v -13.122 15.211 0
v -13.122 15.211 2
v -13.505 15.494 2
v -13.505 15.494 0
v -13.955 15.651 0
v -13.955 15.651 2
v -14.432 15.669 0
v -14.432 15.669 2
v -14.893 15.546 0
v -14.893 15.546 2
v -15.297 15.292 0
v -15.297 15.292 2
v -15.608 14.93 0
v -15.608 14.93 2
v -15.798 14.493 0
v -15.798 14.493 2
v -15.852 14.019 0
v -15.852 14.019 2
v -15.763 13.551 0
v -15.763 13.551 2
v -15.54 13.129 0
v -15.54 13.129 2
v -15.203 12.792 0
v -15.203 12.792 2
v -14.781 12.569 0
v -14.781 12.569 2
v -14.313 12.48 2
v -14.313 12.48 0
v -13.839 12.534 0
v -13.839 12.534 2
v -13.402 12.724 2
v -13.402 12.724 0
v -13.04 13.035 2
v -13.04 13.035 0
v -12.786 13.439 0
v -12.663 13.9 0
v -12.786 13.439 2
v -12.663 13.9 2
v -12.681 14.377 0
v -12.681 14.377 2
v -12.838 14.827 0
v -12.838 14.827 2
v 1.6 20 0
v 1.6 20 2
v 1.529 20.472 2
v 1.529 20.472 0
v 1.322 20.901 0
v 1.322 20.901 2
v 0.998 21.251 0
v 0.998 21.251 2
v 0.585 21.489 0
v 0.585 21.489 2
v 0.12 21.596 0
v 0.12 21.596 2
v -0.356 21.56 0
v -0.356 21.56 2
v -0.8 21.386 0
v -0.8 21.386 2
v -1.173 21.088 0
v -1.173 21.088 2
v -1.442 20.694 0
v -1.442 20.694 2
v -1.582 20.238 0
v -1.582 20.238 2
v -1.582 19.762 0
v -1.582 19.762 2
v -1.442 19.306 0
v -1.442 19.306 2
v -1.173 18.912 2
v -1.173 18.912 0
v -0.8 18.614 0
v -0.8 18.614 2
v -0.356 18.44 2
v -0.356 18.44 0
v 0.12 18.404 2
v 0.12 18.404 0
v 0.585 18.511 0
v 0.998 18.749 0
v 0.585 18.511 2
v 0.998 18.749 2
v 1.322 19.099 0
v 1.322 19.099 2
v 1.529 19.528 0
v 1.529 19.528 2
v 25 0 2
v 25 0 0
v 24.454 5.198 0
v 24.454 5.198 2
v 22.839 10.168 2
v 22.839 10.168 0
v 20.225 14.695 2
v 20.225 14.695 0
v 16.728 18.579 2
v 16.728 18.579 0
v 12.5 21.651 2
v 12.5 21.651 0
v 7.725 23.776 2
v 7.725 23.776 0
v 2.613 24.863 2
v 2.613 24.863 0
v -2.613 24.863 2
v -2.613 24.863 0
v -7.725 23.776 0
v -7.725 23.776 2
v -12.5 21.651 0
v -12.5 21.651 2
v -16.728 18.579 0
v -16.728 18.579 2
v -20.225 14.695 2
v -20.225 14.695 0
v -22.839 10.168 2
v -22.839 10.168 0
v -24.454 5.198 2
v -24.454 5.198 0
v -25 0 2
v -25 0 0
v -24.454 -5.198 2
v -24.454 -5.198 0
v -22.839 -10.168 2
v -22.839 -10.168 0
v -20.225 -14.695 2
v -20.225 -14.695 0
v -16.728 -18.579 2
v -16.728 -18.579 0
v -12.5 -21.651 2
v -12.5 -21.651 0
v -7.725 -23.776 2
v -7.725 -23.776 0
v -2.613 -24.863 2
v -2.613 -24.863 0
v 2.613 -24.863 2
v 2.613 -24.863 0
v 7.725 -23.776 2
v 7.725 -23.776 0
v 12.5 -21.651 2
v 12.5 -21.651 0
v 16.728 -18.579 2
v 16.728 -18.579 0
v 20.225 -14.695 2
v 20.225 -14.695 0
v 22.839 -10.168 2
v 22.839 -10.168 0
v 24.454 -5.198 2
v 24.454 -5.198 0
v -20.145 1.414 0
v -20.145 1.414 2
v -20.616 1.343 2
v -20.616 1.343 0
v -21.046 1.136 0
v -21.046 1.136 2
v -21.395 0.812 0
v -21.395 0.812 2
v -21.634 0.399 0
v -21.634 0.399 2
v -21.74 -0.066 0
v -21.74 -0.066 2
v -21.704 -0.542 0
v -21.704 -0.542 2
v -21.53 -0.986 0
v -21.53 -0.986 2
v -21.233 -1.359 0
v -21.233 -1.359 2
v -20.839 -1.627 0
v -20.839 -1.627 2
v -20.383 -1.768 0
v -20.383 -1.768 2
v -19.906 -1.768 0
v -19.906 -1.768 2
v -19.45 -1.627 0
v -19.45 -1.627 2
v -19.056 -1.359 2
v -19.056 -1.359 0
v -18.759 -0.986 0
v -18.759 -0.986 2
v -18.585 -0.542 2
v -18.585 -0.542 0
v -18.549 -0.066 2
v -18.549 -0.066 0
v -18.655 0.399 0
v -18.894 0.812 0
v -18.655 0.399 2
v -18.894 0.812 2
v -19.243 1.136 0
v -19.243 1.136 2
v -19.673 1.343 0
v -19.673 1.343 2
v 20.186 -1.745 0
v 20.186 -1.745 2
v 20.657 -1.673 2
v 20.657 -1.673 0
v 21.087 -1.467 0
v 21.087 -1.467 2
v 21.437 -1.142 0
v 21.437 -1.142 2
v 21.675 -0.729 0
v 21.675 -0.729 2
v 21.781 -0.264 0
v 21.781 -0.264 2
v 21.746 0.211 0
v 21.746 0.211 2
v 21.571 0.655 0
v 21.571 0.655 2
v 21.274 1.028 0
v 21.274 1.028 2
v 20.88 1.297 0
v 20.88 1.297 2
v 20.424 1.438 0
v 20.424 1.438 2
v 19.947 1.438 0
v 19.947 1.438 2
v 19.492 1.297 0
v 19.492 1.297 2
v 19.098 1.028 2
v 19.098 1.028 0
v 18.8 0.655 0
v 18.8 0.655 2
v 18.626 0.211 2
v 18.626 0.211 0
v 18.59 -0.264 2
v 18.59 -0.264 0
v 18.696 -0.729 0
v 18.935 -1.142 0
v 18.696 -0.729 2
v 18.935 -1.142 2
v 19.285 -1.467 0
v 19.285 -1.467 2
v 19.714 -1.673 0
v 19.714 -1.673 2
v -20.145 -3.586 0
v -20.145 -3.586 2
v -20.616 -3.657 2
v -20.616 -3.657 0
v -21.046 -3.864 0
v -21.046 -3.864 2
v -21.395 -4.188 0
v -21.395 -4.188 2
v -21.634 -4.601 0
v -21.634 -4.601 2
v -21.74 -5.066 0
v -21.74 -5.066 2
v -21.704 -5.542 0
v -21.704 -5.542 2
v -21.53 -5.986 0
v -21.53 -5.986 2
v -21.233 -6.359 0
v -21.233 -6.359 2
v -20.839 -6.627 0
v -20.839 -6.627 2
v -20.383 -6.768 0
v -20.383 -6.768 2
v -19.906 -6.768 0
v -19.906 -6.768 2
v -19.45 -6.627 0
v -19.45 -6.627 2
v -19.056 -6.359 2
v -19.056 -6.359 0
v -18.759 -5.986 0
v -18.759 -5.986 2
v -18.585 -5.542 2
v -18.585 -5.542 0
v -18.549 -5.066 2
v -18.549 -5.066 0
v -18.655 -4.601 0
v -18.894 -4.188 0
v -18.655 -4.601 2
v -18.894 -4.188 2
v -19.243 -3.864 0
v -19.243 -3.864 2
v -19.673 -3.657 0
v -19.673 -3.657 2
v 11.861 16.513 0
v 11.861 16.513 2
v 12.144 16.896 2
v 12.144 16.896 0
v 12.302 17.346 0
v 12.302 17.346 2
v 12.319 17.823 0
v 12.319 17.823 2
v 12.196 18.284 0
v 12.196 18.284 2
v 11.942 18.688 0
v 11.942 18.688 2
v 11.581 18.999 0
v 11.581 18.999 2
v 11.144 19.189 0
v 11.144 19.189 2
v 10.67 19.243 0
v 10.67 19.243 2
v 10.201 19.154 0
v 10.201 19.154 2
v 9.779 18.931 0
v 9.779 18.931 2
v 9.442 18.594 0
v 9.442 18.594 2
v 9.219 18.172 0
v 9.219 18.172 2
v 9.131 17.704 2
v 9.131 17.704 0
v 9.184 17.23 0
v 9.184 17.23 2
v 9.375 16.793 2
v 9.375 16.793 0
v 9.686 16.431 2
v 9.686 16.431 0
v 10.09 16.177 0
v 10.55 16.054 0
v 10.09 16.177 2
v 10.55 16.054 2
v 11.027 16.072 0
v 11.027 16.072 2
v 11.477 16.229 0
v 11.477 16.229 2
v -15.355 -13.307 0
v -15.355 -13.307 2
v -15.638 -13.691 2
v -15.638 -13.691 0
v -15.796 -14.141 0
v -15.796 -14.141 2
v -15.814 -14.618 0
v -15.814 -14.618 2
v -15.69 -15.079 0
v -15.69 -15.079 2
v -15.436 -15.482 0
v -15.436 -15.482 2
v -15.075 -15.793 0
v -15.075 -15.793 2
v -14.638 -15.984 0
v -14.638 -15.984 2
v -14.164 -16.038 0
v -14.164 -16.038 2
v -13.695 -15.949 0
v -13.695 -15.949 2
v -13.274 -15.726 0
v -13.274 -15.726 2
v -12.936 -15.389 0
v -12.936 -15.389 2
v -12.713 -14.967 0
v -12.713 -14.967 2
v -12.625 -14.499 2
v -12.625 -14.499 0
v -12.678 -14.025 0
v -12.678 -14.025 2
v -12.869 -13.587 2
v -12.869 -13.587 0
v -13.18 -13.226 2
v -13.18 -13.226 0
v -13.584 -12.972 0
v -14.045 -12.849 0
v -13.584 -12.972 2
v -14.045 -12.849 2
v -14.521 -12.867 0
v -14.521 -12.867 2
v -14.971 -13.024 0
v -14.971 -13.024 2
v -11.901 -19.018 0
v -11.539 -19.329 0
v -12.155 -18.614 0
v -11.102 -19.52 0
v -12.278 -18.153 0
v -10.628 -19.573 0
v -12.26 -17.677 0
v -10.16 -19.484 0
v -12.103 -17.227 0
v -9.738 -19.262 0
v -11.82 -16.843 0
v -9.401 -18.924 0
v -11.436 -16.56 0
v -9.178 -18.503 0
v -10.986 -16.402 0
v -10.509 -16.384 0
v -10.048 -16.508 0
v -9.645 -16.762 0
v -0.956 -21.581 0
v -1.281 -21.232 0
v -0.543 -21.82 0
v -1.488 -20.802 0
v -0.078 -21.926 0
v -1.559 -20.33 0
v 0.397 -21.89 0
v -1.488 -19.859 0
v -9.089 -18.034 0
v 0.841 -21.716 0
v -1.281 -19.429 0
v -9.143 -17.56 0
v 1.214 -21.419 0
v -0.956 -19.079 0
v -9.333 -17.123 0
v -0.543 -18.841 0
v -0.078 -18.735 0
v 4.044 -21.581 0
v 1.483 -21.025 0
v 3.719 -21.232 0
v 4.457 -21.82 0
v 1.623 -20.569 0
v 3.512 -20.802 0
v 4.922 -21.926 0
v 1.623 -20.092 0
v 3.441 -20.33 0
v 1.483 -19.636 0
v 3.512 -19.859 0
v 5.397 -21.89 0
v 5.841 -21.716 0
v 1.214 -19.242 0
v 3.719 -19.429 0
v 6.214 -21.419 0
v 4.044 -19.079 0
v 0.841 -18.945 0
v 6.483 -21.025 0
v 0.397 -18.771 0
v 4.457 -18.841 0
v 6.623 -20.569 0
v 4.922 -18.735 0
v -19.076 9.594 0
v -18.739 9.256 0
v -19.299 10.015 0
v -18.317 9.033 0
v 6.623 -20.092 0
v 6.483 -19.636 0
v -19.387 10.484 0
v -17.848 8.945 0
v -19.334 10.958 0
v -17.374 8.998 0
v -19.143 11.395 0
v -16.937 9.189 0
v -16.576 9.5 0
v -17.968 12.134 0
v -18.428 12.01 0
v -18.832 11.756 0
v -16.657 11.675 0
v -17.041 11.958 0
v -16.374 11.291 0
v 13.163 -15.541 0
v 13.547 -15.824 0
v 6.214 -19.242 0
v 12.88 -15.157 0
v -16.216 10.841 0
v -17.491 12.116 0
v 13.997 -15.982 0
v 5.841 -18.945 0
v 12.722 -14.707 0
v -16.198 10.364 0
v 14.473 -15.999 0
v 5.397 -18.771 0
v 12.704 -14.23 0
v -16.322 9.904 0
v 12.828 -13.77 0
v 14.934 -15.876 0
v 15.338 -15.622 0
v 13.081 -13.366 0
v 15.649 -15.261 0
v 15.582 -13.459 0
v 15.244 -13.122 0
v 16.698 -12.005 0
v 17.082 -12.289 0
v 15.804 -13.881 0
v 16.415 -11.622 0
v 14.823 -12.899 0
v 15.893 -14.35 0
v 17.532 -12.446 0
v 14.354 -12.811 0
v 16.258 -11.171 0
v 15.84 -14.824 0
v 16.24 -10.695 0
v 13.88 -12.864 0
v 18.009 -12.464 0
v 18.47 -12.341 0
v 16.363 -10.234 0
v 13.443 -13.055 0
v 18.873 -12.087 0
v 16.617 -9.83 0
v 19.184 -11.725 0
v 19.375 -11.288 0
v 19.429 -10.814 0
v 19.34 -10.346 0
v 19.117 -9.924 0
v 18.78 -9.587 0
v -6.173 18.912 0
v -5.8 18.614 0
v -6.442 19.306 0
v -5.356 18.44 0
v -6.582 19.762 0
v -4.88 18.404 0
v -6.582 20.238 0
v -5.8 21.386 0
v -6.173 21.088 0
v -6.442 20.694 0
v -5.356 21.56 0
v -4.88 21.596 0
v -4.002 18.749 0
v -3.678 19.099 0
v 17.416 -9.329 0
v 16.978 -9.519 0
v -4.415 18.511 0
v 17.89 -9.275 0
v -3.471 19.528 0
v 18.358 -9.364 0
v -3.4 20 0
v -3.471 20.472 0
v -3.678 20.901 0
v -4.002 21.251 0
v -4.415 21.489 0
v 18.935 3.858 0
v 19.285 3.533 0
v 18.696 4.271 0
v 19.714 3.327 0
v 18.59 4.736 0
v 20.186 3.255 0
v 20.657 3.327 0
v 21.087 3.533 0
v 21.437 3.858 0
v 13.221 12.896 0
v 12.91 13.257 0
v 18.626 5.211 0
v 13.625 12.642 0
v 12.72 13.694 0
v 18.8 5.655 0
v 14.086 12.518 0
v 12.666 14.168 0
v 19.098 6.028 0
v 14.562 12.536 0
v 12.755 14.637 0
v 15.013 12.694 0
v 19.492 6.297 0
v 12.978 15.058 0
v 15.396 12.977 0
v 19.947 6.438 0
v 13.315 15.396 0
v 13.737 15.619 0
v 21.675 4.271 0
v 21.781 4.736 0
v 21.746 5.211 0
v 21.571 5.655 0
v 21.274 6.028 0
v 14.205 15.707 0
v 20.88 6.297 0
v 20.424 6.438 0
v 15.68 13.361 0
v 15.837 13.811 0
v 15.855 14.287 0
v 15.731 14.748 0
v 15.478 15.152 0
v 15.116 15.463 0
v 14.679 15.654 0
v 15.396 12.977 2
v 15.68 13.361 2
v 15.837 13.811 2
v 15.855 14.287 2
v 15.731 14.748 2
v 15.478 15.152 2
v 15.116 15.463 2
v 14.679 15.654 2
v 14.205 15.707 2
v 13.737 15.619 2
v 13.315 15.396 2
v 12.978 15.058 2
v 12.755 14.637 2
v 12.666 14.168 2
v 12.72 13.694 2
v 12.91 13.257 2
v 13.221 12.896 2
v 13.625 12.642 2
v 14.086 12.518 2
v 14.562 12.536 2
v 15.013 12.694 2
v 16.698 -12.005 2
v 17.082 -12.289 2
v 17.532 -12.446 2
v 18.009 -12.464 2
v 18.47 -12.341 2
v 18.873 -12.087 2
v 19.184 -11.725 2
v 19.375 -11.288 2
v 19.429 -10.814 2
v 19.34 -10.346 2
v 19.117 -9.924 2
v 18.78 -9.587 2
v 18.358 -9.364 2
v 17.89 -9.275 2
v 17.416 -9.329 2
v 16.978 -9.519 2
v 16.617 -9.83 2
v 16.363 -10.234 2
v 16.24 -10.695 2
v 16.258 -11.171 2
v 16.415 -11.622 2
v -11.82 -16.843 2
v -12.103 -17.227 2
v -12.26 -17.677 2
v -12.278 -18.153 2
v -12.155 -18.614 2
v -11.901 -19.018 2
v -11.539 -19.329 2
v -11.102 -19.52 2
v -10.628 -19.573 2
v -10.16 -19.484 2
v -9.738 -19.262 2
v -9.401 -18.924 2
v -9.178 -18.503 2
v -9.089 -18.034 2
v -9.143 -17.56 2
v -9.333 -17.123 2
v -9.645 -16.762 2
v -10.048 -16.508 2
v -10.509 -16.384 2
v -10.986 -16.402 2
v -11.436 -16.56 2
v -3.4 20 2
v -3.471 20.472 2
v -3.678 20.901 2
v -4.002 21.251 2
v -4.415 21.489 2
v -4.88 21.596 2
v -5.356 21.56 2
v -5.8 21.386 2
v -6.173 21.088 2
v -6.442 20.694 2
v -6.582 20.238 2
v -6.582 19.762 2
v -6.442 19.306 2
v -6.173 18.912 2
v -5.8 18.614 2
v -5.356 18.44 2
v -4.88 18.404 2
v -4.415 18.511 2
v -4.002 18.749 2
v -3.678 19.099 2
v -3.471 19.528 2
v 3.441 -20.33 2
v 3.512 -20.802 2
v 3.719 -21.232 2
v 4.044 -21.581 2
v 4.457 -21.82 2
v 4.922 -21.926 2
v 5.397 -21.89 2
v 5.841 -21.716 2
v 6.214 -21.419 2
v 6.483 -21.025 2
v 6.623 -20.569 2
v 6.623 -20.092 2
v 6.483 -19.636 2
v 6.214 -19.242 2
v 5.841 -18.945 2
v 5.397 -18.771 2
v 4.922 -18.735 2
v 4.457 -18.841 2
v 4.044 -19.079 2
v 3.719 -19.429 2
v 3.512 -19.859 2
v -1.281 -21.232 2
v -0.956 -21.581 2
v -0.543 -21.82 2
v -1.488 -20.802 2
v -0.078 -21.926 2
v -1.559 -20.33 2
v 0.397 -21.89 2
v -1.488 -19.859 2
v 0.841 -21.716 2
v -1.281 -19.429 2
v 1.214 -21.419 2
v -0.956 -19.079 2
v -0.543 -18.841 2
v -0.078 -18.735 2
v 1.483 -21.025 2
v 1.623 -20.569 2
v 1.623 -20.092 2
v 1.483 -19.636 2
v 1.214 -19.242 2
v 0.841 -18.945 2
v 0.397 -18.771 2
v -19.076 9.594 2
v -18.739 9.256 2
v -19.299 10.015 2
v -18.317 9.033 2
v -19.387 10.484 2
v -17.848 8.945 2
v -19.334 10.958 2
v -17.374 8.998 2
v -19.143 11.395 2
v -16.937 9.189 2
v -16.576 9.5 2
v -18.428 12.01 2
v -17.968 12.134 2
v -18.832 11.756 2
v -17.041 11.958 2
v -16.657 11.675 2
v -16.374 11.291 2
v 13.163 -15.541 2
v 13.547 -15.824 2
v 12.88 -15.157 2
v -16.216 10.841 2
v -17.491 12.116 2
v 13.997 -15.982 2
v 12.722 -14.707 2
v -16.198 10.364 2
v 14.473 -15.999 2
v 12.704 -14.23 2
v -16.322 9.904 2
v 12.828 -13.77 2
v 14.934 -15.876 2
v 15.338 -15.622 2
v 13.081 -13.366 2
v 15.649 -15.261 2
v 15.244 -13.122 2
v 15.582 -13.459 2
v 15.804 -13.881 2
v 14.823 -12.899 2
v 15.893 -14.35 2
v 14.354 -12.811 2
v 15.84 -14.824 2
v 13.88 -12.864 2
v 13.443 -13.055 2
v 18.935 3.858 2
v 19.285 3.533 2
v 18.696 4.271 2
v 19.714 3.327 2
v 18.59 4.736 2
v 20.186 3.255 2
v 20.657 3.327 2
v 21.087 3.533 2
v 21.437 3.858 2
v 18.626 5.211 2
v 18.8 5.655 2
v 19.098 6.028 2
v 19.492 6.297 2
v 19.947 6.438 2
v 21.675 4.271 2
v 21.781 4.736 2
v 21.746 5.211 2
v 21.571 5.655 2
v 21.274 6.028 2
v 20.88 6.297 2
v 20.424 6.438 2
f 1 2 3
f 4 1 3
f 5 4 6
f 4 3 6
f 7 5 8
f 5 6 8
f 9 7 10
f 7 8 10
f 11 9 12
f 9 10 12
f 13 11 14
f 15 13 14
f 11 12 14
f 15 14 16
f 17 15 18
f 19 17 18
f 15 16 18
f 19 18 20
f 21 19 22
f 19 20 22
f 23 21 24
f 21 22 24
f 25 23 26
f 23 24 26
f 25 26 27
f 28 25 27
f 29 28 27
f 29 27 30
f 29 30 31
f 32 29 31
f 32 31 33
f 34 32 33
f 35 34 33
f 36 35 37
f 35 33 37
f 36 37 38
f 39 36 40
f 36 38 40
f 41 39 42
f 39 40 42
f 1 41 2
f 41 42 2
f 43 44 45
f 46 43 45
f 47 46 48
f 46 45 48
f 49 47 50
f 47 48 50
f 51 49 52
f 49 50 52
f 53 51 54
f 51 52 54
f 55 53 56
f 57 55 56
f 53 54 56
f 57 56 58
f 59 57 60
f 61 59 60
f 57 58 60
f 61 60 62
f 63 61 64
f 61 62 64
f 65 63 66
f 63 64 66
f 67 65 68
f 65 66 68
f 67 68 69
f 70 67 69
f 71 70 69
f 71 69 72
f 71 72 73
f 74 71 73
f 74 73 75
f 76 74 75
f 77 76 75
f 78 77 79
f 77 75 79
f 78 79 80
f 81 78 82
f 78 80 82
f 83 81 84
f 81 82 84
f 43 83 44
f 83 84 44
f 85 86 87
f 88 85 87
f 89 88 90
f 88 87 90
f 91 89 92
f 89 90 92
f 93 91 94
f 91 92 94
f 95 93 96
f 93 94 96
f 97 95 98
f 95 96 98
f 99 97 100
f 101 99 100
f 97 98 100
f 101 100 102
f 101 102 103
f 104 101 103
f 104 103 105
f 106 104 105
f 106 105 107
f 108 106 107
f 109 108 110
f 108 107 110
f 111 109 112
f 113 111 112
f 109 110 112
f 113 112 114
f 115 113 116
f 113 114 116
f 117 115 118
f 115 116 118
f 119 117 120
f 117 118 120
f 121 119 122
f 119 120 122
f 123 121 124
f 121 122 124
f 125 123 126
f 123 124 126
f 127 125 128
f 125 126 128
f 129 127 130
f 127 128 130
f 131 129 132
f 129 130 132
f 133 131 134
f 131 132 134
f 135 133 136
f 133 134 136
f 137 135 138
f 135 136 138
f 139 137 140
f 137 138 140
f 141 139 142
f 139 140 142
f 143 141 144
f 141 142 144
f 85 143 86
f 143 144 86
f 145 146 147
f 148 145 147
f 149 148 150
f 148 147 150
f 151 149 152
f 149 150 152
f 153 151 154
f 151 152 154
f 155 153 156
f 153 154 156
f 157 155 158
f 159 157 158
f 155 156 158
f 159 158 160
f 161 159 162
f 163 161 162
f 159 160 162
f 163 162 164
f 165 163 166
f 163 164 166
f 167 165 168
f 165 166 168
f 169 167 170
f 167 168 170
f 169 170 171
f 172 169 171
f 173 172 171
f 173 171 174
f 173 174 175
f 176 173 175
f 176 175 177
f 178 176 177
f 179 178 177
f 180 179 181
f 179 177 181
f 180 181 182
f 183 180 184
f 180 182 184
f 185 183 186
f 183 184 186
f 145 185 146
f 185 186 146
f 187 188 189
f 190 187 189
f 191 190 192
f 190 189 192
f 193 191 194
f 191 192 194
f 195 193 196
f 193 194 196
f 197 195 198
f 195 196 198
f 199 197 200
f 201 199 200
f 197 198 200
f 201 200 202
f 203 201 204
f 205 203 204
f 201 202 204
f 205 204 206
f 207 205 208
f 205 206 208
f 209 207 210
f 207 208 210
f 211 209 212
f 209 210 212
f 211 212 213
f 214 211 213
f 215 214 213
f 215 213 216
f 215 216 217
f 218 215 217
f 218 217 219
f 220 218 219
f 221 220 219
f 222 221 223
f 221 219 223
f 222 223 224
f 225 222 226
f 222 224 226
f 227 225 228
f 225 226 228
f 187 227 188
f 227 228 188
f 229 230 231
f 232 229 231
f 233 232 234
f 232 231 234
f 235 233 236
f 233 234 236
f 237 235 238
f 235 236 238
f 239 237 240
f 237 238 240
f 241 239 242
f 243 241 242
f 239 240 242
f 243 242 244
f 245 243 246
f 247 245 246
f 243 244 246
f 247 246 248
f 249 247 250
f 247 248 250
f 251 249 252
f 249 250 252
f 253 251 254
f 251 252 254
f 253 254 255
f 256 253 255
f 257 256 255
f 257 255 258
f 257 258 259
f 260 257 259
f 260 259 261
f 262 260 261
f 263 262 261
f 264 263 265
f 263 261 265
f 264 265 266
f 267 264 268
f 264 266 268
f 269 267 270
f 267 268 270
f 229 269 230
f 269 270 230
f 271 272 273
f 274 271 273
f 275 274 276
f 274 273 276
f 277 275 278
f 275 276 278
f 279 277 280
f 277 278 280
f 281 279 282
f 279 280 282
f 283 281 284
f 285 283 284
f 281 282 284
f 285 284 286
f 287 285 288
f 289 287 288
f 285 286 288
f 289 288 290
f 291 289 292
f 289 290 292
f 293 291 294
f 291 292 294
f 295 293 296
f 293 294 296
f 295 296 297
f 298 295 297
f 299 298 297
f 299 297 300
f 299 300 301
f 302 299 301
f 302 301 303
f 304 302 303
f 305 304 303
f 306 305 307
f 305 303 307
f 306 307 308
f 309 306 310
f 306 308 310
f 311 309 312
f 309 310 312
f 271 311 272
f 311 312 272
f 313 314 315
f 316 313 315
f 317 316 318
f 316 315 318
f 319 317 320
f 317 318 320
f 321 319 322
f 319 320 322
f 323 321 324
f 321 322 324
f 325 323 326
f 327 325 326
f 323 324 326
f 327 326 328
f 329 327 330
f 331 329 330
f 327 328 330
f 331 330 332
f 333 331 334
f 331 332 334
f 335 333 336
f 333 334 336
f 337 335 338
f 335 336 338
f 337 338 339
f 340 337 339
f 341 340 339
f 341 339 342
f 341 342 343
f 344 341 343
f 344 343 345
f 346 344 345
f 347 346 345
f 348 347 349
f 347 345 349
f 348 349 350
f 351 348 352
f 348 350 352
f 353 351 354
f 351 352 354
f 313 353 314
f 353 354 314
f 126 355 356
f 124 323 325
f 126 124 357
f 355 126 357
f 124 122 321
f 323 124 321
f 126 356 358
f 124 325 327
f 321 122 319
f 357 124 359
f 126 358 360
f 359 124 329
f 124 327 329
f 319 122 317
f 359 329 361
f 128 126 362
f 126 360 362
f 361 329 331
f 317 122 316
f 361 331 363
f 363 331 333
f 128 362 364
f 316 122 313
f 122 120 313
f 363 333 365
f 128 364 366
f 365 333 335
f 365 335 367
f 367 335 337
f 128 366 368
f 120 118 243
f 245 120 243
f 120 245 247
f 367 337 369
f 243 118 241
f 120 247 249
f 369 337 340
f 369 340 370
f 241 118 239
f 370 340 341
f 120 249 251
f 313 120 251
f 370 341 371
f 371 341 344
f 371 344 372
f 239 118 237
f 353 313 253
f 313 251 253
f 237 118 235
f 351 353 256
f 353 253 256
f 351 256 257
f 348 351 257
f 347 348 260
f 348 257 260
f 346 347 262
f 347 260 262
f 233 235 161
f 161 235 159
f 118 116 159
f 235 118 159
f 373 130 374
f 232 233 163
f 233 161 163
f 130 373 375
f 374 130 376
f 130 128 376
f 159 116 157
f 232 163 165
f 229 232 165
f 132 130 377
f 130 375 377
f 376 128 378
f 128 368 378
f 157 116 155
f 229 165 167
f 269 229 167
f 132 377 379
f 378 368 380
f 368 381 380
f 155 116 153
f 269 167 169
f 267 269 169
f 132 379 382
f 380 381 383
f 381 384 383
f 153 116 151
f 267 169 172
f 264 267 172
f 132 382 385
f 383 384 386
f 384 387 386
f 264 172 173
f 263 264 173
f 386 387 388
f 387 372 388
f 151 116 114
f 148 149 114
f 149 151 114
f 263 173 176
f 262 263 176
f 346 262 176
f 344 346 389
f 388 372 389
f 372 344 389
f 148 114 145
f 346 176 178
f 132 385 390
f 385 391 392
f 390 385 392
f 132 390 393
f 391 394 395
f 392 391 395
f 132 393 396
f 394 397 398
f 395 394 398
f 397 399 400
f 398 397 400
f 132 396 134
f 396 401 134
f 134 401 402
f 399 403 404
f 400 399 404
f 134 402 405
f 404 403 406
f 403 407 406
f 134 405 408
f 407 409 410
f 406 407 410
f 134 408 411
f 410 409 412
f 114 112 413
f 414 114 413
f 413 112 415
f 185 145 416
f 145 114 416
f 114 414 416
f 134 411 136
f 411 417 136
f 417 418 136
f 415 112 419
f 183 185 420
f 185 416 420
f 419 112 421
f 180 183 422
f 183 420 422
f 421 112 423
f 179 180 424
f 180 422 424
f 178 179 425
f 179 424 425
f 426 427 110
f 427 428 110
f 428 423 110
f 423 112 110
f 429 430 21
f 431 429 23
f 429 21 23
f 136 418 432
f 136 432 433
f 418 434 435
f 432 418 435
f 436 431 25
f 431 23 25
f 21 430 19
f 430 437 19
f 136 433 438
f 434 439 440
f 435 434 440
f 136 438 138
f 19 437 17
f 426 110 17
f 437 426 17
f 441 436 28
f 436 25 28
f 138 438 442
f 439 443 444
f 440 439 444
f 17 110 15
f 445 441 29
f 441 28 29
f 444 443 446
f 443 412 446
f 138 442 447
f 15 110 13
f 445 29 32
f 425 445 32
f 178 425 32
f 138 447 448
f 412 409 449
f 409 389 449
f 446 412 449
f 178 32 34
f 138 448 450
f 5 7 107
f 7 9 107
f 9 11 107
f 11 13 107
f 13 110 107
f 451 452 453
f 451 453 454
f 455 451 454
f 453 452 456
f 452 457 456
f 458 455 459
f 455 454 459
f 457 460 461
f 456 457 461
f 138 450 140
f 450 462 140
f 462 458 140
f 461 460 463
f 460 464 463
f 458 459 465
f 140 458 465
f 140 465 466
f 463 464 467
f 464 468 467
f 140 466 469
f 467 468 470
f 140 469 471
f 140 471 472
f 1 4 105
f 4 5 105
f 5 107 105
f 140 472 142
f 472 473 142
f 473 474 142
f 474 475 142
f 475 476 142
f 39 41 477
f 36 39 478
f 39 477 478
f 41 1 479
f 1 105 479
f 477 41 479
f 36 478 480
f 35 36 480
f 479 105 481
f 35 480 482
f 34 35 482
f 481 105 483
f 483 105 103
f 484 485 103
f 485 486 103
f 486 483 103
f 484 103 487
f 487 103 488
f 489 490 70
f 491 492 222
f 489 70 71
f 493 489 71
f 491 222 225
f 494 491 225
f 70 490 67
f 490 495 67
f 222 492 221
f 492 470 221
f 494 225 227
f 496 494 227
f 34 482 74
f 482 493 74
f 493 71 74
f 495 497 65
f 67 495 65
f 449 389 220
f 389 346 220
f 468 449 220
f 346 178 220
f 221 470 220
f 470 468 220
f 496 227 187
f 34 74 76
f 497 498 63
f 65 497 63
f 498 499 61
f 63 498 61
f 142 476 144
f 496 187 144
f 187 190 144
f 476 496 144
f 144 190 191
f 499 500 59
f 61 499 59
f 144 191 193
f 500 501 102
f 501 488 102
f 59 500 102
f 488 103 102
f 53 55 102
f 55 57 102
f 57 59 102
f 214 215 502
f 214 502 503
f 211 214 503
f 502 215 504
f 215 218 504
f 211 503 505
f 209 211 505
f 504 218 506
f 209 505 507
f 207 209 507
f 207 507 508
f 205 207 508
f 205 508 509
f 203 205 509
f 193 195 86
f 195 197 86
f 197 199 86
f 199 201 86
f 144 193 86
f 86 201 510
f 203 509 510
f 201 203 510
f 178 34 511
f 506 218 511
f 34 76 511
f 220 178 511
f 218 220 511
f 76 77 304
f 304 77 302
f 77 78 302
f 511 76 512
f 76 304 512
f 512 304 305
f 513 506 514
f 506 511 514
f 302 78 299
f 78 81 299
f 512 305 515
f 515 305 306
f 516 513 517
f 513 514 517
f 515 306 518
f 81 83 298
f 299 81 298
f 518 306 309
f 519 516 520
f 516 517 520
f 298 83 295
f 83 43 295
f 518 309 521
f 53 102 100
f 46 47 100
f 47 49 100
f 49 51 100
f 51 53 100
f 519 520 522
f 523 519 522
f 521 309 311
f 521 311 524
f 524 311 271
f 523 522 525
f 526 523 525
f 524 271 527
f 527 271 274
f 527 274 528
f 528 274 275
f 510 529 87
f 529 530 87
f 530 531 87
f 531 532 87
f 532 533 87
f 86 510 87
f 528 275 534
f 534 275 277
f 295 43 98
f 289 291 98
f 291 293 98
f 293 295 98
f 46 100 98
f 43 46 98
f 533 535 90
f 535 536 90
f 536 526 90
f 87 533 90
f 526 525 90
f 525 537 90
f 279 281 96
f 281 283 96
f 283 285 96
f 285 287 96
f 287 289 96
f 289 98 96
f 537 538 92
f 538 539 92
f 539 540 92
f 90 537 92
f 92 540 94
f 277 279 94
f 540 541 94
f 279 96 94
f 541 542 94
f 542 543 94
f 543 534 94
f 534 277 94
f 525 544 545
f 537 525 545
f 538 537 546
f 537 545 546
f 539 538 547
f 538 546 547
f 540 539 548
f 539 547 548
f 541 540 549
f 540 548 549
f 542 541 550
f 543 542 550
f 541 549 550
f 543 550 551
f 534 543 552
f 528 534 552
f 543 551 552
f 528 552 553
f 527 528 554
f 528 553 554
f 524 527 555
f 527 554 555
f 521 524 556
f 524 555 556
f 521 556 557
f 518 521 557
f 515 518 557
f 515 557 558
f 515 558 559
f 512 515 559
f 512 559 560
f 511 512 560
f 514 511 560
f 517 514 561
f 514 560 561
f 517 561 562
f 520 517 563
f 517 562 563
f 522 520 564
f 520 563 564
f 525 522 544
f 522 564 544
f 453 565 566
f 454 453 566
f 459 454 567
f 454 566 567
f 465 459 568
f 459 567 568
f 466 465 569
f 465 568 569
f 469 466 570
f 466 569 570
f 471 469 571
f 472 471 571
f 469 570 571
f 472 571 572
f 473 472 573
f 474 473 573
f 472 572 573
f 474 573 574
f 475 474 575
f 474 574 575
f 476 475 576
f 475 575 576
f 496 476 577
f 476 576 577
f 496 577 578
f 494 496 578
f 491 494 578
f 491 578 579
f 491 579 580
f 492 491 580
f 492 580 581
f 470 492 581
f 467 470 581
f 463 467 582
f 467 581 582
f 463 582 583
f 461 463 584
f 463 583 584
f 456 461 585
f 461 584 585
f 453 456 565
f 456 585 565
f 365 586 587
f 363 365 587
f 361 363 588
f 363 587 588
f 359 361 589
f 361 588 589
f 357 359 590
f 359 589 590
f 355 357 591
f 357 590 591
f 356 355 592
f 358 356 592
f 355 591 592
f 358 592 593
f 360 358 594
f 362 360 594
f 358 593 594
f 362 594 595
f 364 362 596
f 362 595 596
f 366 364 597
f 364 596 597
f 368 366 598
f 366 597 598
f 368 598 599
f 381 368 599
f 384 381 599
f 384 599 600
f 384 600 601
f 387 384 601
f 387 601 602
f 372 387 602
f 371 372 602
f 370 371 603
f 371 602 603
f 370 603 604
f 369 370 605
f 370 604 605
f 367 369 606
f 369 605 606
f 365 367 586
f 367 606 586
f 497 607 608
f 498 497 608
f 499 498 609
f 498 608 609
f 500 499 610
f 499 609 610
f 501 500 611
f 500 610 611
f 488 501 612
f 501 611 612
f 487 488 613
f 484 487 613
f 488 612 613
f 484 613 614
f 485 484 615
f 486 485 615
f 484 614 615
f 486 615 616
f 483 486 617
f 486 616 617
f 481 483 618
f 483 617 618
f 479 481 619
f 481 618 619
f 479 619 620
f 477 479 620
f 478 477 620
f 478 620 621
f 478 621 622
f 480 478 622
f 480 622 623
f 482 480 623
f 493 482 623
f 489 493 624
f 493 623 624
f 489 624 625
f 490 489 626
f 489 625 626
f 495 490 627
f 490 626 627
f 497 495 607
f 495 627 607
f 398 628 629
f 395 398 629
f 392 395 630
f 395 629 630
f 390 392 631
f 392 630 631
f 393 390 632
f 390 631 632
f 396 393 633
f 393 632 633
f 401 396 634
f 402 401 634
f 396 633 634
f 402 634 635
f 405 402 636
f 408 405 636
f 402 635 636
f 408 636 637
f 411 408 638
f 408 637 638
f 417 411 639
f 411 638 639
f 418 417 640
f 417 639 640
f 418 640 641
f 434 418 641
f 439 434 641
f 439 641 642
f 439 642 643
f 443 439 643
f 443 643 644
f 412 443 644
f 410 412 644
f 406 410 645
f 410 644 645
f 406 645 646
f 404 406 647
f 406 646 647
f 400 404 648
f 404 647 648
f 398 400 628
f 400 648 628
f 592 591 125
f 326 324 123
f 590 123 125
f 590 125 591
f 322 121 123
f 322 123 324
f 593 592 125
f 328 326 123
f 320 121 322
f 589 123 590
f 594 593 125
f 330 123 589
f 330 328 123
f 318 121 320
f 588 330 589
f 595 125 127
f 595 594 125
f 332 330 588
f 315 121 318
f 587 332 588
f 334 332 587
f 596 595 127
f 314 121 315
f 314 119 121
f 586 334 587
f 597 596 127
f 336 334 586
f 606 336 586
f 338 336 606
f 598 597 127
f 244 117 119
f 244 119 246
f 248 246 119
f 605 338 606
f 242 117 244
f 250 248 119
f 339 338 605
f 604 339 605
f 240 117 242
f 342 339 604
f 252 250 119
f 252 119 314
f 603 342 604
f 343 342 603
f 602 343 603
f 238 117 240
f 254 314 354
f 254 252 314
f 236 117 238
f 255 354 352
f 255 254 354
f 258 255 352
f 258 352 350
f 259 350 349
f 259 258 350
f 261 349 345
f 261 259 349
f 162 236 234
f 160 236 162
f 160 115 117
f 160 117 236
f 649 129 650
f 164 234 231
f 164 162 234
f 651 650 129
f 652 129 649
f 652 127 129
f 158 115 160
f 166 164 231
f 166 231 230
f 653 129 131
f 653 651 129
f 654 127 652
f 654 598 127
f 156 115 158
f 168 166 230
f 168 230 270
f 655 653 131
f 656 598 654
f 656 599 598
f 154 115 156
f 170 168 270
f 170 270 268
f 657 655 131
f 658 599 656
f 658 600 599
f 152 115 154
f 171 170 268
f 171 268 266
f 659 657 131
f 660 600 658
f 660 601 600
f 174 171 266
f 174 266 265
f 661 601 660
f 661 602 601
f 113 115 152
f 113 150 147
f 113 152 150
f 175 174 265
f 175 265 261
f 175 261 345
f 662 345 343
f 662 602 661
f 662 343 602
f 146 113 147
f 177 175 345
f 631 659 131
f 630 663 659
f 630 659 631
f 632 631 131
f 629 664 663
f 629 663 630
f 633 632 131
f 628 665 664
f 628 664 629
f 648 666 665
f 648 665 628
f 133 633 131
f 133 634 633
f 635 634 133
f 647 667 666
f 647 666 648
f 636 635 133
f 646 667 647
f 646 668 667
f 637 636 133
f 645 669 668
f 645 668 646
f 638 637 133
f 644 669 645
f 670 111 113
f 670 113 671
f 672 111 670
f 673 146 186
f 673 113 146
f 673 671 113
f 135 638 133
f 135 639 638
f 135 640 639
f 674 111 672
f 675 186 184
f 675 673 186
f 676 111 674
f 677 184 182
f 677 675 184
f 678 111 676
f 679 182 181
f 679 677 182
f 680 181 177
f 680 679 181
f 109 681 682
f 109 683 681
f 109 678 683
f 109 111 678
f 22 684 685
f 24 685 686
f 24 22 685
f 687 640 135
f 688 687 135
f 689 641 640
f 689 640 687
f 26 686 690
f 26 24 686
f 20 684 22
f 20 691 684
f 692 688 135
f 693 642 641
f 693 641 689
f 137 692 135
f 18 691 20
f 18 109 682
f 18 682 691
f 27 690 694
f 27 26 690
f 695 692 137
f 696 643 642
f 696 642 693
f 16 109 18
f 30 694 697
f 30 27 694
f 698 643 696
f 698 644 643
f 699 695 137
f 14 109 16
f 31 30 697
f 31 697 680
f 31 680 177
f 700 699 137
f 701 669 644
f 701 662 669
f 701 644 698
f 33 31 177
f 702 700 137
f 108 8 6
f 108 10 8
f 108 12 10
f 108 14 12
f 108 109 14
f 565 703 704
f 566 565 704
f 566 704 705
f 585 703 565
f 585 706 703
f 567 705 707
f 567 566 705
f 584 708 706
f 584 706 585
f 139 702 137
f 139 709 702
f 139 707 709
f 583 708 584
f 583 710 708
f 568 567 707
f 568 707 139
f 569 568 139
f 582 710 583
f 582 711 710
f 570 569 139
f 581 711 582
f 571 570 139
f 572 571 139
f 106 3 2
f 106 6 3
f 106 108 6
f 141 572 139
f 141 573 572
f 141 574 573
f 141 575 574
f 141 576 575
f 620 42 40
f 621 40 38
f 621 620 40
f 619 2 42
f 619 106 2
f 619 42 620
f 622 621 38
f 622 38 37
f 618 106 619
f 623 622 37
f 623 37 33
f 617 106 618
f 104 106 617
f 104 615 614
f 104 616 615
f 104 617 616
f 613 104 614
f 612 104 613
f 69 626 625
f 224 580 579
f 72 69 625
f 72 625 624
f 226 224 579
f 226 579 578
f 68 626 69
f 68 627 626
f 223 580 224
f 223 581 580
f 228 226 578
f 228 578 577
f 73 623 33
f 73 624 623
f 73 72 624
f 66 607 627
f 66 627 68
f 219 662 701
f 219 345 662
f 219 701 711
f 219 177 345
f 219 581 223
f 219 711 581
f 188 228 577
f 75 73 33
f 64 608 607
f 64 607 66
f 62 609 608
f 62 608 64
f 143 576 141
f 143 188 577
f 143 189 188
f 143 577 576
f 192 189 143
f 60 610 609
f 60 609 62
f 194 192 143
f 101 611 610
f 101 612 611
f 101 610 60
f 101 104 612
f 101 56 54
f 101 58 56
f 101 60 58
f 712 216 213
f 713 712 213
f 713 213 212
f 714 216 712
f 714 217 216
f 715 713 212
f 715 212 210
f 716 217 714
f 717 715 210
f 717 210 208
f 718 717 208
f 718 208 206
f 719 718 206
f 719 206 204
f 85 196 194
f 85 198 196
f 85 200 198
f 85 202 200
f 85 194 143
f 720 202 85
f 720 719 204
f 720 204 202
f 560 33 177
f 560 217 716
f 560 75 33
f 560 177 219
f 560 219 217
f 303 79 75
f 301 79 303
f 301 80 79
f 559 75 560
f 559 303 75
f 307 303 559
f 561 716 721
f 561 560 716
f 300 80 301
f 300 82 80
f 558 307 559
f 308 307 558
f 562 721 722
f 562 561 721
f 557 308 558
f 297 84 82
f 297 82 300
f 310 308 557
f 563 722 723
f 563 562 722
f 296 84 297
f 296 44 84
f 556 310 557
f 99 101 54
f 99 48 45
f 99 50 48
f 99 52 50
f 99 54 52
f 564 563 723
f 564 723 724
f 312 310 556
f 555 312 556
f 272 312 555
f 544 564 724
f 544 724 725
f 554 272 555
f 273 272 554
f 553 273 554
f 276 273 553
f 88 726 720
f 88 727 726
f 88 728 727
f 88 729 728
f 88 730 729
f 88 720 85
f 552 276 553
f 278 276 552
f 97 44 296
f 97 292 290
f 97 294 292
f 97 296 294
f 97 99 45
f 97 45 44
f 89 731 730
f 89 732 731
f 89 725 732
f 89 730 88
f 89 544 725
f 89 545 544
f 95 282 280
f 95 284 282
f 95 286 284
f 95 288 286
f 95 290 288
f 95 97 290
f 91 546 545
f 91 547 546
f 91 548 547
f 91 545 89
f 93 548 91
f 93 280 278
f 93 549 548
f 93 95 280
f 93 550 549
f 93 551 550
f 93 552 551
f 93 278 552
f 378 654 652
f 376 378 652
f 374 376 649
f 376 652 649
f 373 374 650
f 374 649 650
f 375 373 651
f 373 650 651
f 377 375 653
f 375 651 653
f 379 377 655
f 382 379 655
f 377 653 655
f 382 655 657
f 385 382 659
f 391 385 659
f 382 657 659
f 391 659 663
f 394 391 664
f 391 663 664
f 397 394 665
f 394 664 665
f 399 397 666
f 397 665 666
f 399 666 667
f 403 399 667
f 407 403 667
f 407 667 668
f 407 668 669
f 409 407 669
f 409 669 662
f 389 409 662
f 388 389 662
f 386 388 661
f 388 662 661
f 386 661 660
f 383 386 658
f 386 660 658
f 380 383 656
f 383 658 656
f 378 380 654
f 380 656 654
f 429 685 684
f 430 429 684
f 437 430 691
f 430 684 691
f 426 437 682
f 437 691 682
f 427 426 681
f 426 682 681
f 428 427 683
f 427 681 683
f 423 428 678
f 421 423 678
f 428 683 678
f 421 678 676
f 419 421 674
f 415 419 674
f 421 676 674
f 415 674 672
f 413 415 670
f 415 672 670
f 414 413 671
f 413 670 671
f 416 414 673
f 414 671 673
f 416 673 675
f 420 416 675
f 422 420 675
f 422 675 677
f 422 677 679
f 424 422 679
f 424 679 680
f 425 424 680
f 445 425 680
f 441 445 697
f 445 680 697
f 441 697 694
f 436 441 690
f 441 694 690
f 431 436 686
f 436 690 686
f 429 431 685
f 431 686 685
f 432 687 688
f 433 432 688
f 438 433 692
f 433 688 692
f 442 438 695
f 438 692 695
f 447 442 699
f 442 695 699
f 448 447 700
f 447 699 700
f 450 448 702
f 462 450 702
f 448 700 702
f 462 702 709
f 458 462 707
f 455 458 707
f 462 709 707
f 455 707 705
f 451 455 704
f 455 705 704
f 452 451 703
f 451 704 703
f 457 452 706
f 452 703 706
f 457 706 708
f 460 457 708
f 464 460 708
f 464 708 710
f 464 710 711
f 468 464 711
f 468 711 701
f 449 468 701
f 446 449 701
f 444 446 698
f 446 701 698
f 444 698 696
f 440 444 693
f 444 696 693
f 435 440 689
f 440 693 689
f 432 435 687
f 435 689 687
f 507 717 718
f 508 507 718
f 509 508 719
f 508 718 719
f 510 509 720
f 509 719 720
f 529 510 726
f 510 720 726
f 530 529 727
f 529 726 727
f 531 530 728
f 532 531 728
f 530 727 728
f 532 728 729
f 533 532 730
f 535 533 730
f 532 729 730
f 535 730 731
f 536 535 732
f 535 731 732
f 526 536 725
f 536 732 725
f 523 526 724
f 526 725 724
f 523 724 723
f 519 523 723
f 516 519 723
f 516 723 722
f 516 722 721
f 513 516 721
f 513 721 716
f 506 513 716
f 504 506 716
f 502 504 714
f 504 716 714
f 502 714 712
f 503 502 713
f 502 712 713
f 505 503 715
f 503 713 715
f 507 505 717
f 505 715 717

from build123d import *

# Parameters (mm, degrees)
SKETCH_1_R               = 25
EXTRUDE_1_DEPTH          = 2
SKETCH_2_R               = 1.6
CUT_EXTRUDE_1_DEPTH      = 2
PATTERN_CIRCULAR_1_COUNT = 8


with BuildPart() as part:
    # ｽｹｯﾁ1 → ﾎﾞｽ - 押し出し1 (new body)
    with BuildSketch(Plane.XY):
        Circle(SKETCH_1_R)
    extrude(amount=EXTRUDE_1_DEPTH)

    # ｽｹｯﾁ2 → ｶｯﾄ - 押し出し1 (cut)
    with BuildSketch(Plane.XY.offset(2)):
        with Locations((0, 20)):
            Circle(SKETCH_2_R)
        with Locations((-5, 20)):
            Circle(SKETCH_2_R)
    cut_extrude_1 = extrude(amount=-CUT_EXTRUDE_1_DEPTH, mode=Mode.SUBTRACT)

    # 円形ﾊﾟﾀｰﾝ1: ｶｯﾄ - 押し出し1 ×8 about axis
    pattern_circular_1_axis = Axis((0.020649158, -0.165193263, 0), (0, 0, 1))
    for i in range(1, PATTERN_CIRCULAR_1_COUNT):
        add(cut_extrude_1.rotate(pattern_circular_1_axis, i * 360 / PATTERN_CIRCULAR_1_COUNT), mode=Mode.SUBTRACT)


solid = part.part
